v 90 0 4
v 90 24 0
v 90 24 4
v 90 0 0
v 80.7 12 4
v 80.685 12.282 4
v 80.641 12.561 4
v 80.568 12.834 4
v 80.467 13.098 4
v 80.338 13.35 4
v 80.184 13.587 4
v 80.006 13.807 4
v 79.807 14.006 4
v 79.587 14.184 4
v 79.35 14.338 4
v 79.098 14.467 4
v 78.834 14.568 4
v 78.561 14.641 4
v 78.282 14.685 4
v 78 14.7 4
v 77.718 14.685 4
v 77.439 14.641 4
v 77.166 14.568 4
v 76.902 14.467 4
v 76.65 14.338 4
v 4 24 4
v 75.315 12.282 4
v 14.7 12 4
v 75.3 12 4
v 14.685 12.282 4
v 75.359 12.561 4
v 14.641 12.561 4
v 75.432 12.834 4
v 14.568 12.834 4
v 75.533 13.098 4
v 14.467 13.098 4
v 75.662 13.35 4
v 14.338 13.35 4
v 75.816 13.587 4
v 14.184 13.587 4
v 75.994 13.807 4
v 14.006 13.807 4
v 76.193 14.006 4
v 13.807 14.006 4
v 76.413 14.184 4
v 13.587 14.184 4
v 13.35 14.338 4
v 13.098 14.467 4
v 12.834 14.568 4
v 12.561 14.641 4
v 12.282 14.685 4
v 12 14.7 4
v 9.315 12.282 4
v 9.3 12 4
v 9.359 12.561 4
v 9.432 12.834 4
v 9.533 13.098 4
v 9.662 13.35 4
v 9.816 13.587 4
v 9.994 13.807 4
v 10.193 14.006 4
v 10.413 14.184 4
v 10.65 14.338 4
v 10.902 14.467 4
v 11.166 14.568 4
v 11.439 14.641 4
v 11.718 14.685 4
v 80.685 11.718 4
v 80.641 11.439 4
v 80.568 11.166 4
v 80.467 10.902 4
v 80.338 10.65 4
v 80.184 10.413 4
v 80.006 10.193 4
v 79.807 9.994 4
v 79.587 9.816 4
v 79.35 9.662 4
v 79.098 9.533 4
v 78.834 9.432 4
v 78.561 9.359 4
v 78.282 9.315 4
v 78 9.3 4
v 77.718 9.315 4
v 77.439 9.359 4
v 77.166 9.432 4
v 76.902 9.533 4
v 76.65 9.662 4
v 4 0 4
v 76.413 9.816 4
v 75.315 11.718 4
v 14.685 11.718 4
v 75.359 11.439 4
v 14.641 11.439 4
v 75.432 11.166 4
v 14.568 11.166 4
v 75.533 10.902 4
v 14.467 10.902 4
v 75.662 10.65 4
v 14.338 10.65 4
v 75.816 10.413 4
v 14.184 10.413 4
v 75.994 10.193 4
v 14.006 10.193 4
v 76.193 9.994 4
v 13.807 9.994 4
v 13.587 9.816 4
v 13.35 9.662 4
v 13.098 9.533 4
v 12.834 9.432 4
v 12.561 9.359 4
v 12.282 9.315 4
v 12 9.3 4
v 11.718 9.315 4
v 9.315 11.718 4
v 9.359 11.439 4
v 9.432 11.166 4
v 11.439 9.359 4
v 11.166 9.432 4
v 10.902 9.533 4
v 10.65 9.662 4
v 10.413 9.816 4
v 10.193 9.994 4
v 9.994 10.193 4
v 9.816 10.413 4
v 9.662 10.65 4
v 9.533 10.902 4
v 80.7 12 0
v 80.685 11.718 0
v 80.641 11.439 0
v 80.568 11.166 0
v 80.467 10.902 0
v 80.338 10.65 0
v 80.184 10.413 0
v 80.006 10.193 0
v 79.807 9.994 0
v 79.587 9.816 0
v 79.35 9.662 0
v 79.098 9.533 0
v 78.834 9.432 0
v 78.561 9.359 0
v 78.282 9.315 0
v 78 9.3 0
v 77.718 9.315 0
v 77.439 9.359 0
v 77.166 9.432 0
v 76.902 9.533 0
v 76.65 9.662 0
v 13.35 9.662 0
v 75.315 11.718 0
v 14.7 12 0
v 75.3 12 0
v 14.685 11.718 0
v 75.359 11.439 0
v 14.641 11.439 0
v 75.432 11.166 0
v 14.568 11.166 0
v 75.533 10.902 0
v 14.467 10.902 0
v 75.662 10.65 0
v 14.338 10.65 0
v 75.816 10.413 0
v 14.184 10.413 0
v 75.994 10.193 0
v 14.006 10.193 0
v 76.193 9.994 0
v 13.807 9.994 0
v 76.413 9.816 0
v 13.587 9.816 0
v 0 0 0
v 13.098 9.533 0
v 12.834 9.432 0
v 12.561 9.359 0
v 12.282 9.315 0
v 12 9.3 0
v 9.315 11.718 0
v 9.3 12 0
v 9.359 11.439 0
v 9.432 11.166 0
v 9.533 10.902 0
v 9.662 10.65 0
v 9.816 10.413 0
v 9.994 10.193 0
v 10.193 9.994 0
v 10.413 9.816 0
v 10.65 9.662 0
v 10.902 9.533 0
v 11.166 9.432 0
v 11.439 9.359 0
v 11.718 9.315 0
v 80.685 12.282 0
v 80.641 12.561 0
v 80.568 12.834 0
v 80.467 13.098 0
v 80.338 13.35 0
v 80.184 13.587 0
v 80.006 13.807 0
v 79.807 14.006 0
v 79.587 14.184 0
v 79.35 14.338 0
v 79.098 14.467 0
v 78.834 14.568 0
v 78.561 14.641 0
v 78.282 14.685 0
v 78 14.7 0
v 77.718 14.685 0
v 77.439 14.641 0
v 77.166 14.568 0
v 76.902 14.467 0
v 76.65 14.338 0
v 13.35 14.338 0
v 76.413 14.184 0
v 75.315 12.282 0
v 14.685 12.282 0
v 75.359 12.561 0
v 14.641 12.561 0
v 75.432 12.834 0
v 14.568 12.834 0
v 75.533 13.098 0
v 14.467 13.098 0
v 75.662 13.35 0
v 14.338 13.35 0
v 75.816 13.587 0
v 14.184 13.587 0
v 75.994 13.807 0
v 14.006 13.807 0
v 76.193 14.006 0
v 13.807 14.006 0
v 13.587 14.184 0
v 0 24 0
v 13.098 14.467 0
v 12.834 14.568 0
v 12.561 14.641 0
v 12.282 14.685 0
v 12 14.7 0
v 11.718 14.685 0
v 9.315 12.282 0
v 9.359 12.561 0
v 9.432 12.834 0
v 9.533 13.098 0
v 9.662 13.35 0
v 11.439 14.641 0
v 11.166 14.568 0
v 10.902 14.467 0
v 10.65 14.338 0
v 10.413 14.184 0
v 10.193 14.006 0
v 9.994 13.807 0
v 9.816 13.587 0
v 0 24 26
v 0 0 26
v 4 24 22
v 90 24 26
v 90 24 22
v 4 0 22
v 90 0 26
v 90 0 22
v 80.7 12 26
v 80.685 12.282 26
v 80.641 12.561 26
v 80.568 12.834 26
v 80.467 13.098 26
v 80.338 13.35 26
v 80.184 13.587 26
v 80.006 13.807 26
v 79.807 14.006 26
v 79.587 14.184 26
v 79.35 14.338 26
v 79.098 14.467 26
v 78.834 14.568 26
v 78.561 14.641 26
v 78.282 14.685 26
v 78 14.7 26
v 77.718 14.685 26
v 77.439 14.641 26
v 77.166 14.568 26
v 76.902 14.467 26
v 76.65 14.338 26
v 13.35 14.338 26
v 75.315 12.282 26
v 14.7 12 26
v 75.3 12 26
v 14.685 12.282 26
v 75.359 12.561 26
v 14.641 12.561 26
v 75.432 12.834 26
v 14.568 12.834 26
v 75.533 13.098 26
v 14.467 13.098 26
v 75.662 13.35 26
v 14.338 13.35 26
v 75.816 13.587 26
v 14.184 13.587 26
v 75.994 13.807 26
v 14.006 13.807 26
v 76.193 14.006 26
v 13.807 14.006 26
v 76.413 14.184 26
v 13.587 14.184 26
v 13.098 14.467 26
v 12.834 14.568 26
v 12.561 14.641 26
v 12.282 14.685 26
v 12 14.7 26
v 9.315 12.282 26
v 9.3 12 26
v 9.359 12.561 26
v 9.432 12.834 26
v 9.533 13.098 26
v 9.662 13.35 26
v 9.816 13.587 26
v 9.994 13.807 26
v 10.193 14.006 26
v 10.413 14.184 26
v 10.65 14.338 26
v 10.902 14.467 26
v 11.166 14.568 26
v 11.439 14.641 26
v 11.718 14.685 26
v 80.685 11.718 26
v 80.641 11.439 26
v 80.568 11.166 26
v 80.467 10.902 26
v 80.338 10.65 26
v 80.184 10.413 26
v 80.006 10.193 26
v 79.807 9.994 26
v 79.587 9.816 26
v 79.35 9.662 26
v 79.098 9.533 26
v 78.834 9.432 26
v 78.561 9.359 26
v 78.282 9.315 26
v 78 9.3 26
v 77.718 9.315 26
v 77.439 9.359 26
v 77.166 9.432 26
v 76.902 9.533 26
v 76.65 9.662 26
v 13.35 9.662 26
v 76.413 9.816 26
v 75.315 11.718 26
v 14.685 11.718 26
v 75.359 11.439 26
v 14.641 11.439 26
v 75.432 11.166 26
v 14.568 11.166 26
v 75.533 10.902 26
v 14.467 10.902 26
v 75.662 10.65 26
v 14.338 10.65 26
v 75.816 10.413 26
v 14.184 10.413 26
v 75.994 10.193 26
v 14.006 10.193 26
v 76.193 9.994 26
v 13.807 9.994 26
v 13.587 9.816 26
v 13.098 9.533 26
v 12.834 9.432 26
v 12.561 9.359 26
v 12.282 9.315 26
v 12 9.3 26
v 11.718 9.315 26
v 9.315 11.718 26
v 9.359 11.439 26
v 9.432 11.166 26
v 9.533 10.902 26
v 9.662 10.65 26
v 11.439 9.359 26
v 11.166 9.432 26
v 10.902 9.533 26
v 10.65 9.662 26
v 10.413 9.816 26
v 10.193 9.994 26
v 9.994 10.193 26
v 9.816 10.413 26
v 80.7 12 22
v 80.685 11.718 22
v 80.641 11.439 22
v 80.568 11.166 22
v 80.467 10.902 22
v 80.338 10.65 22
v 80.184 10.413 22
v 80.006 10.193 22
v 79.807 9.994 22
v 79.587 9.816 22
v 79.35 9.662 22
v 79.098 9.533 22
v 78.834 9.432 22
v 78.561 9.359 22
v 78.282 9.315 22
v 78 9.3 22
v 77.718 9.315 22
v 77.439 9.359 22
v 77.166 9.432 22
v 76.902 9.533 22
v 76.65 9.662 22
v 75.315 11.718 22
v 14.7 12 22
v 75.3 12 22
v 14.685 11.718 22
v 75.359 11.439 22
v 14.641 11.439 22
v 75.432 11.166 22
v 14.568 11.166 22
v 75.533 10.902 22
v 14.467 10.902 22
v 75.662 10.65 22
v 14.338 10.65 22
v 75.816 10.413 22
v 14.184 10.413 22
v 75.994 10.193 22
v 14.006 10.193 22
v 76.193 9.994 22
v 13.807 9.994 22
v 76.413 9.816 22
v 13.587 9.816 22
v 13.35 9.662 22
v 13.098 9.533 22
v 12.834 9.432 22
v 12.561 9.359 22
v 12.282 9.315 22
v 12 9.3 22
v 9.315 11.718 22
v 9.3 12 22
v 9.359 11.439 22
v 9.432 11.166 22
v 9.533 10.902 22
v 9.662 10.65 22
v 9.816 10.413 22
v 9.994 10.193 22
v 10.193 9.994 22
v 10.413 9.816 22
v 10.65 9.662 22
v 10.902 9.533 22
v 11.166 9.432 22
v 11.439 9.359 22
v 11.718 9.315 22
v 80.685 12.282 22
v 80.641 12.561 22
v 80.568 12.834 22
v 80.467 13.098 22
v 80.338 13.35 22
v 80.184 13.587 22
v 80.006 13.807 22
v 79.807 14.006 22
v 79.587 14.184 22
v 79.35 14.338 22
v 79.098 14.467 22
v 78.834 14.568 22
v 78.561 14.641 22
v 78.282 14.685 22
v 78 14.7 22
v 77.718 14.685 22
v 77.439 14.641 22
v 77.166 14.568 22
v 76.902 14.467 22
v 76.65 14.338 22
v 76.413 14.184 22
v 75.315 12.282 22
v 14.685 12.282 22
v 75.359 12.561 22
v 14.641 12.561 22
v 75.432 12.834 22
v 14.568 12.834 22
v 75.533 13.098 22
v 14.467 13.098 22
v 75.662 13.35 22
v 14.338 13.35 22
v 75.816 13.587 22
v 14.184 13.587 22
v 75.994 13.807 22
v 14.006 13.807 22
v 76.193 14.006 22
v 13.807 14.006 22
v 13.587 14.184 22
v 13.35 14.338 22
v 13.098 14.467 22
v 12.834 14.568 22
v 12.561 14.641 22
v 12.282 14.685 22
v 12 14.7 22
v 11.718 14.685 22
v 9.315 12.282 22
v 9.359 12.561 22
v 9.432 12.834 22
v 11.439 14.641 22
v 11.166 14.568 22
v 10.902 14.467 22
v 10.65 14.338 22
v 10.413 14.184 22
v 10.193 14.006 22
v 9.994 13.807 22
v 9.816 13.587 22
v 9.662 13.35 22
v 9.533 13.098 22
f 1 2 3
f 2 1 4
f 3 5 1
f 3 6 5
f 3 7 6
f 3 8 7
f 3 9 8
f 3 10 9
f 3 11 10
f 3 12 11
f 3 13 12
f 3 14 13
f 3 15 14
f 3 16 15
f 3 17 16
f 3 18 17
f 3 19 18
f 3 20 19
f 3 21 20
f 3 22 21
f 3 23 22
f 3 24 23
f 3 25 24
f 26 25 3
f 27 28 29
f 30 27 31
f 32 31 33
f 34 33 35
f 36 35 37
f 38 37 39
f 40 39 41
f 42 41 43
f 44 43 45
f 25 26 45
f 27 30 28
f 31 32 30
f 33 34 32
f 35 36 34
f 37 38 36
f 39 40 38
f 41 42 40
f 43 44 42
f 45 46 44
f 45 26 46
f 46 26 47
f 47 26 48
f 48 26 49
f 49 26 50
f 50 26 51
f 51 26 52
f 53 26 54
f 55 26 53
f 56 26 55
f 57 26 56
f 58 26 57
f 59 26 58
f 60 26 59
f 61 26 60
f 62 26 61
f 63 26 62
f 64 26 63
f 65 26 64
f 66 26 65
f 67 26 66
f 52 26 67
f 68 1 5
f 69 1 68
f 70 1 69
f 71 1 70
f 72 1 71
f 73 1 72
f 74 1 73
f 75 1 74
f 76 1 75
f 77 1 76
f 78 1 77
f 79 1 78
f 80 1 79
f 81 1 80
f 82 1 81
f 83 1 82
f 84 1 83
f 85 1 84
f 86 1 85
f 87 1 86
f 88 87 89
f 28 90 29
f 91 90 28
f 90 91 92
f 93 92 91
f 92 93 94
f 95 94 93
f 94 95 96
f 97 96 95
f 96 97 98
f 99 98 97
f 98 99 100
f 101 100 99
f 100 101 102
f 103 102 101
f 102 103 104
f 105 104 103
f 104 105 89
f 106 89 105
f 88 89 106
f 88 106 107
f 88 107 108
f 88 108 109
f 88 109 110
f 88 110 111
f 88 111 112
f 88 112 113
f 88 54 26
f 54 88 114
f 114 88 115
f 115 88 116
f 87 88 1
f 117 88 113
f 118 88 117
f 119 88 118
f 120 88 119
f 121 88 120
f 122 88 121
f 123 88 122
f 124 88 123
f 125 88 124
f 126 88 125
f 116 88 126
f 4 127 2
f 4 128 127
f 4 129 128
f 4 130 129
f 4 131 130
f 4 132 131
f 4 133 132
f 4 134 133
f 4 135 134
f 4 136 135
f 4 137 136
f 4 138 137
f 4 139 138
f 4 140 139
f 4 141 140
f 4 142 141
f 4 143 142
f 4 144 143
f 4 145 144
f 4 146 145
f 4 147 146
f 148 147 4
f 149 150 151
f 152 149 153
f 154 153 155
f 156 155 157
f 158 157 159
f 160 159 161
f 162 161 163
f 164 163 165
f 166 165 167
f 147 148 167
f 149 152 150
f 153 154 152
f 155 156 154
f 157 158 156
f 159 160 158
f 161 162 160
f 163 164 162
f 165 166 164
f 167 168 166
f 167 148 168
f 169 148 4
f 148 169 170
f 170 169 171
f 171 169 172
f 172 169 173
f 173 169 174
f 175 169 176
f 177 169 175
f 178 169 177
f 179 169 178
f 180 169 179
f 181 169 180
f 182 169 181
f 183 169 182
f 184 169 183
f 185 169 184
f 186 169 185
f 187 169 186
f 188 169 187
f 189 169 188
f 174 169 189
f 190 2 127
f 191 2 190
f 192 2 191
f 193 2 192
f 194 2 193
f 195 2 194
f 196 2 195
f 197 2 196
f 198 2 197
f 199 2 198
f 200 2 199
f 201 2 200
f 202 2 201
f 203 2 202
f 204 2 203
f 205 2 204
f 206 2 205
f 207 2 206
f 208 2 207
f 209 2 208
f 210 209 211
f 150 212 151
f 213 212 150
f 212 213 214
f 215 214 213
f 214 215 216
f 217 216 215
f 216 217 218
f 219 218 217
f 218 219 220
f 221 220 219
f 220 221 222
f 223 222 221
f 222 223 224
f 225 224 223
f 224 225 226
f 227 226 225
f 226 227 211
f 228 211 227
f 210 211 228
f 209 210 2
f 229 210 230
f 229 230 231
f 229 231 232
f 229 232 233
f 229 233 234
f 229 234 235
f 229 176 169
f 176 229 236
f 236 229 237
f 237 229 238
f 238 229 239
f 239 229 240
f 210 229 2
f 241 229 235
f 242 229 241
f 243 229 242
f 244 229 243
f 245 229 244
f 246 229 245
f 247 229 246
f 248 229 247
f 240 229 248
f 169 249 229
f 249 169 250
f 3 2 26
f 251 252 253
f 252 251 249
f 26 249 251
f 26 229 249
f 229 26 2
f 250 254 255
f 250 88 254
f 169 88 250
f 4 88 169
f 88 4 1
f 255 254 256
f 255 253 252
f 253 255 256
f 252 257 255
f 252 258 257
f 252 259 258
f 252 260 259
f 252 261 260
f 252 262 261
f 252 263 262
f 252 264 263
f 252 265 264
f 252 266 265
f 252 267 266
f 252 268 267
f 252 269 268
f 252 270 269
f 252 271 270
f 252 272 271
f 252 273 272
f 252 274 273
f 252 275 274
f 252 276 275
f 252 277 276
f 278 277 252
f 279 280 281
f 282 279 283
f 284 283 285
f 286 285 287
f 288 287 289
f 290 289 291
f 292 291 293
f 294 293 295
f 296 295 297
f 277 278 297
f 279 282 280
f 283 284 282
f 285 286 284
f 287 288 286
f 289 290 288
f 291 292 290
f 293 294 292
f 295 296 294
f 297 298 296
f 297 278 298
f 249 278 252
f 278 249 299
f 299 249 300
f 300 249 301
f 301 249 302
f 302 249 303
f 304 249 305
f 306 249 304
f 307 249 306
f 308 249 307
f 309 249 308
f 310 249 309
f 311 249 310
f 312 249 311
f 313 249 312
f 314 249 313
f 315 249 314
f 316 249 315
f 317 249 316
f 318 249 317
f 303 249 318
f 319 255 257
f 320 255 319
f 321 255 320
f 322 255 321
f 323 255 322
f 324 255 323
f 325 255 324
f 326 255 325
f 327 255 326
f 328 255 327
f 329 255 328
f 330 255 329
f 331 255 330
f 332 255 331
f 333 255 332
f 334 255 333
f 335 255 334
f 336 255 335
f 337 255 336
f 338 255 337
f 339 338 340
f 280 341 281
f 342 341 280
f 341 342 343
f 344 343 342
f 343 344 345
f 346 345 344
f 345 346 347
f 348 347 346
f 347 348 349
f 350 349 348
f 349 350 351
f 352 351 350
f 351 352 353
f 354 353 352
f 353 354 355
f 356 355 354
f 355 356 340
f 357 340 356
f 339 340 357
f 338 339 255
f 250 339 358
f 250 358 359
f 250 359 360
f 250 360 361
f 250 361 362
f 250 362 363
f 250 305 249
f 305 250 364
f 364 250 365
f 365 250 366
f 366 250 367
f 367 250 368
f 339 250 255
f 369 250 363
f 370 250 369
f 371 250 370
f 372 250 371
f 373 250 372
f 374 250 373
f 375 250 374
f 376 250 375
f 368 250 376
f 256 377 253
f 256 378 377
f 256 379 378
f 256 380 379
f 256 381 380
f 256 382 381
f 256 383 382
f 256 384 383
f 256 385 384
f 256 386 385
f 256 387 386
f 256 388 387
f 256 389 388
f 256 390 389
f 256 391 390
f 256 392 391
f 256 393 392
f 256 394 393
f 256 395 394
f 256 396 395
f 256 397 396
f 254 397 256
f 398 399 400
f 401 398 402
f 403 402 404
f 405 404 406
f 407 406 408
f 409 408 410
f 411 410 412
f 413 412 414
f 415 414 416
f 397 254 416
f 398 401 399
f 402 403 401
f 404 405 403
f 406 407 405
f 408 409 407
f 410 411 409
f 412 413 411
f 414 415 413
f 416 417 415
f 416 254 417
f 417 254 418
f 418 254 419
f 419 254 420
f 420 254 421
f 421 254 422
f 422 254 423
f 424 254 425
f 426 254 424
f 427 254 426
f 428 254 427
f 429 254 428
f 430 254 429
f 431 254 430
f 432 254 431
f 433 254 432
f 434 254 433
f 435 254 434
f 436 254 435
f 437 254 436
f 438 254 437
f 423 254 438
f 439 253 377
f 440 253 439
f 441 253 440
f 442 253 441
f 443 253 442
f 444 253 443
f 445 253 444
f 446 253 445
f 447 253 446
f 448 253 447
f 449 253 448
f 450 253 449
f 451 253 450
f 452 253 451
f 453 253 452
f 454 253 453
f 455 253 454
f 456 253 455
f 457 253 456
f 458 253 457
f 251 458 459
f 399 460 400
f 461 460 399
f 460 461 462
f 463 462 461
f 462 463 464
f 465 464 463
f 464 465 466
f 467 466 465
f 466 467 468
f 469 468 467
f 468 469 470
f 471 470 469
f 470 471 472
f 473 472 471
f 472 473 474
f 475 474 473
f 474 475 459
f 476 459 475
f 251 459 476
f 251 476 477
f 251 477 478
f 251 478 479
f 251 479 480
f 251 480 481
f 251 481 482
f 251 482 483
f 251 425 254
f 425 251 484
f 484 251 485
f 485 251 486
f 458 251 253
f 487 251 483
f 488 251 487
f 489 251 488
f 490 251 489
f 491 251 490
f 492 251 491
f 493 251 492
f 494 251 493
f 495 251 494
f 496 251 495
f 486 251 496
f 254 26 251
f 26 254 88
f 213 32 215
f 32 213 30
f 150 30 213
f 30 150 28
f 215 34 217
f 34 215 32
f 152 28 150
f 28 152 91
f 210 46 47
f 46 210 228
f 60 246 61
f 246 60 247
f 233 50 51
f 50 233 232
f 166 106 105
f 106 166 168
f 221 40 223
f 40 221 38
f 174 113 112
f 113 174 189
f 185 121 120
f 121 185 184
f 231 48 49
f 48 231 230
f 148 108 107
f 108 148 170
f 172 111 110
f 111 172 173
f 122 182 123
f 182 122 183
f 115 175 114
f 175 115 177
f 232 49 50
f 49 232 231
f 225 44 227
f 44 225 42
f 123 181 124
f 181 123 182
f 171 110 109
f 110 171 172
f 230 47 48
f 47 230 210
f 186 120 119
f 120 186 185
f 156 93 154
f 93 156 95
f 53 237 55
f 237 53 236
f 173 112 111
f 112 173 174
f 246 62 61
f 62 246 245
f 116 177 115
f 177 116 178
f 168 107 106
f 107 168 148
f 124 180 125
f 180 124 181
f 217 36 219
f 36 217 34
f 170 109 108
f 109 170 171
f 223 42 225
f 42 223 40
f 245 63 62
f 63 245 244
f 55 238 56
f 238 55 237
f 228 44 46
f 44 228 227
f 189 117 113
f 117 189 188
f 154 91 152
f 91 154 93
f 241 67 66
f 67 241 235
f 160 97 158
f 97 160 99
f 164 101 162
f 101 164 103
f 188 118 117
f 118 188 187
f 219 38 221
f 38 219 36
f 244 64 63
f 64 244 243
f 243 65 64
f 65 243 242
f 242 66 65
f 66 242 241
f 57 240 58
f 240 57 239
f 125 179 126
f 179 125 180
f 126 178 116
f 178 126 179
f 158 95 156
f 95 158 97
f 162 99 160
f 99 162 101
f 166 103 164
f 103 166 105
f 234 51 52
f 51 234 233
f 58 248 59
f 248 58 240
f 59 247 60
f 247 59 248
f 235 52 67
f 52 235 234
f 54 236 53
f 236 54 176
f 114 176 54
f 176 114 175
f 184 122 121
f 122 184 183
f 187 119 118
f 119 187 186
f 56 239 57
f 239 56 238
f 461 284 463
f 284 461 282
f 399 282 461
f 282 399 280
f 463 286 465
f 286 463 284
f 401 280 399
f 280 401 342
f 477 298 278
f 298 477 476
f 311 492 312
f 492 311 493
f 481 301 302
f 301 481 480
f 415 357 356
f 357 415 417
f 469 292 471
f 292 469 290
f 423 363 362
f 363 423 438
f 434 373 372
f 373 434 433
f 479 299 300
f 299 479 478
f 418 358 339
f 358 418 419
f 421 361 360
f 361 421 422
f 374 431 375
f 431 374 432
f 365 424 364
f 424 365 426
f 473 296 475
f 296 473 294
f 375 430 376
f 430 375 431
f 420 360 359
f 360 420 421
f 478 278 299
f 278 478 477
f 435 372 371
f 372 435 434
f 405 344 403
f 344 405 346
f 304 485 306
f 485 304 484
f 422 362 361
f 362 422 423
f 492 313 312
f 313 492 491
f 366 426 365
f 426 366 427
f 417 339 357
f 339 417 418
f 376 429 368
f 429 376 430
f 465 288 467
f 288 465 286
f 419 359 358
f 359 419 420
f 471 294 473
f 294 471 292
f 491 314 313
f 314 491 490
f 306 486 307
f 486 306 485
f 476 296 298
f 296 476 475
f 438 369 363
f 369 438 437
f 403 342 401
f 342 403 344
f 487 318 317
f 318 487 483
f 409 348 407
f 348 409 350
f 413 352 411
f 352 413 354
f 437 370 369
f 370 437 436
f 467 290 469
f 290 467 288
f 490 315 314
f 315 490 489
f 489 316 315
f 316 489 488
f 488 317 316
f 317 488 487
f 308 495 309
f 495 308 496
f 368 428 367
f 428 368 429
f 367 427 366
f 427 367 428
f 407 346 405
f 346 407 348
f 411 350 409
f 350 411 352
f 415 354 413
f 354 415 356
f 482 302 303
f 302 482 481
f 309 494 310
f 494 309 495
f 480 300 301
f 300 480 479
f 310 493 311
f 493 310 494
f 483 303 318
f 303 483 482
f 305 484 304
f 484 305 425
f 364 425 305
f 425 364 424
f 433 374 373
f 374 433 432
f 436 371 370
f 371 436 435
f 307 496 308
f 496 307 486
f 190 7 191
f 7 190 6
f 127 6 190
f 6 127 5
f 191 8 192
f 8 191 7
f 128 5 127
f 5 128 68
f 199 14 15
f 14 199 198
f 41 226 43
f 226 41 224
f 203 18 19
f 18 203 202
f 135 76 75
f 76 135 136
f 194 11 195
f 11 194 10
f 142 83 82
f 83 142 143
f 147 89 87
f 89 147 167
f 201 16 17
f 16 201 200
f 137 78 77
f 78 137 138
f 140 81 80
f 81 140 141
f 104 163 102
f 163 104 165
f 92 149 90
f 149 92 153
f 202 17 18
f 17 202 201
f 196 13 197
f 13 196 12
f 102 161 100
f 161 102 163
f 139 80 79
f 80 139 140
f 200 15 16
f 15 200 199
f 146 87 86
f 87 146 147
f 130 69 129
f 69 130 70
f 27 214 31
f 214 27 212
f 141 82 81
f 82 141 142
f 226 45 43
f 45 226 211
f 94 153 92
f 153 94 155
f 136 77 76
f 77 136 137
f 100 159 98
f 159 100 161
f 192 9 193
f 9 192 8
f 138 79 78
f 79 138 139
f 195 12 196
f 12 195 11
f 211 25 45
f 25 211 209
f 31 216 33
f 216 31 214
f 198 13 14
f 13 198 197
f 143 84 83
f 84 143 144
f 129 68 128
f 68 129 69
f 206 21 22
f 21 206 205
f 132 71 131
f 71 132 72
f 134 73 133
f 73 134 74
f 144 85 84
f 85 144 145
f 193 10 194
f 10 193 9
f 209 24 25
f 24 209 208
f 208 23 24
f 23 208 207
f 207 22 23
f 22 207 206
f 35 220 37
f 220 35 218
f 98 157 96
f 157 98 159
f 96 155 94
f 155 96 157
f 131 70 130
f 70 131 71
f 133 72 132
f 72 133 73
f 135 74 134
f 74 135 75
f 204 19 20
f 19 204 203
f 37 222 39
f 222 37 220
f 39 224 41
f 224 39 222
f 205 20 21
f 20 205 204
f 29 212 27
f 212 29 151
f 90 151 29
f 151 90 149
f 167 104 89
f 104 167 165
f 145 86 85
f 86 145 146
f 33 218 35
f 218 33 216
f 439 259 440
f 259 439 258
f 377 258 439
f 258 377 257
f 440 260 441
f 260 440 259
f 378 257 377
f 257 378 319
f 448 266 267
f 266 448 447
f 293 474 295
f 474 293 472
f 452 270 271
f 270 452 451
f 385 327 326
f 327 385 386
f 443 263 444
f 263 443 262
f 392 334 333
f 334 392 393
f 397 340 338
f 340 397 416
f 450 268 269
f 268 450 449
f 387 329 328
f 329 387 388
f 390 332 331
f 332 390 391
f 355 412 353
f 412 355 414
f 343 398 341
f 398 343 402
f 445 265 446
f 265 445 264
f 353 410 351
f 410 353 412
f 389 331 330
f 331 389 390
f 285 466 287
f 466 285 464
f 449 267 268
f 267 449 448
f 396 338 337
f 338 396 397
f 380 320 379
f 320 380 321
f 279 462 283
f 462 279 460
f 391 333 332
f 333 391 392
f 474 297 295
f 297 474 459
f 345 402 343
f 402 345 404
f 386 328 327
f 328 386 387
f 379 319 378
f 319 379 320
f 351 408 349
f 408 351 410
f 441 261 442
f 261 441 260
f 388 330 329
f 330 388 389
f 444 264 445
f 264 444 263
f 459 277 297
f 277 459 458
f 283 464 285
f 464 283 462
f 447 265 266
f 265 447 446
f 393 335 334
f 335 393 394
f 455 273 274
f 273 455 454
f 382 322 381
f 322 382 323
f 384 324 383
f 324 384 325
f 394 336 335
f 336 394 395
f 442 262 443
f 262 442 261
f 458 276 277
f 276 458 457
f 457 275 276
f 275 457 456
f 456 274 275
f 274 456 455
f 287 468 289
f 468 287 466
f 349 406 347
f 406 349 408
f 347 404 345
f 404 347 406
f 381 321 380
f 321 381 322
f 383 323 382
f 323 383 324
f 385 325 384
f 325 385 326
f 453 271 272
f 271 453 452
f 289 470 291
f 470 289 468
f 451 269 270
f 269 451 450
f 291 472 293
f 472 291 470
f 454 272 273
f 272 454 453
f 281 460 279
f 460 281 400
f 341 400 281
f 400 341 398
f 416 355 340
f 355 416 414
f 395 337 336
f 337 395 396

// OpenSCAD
// Z-offset mounting bracket.
$fn = 60;
eps = 0.02;
length = 90;
height = 22;
width = 24;
thickness = 4;
difference() {
    union() {
        cube([length,width,thickness]);
        translate([0,0,height]) cube([length,width,thickness]);
        translate([0,0,thickness]) cube([thickness,width,height-thickness]);
    }
    for (x=[12,length-12]) {
        translate([x,width/2,-eps]) cylinder(d=5.4,h=thickness+2*eps);
        translate([x,width/2,height-eps]) cylinder(d=5.4,h=thickness+2*eps);
    }
}
